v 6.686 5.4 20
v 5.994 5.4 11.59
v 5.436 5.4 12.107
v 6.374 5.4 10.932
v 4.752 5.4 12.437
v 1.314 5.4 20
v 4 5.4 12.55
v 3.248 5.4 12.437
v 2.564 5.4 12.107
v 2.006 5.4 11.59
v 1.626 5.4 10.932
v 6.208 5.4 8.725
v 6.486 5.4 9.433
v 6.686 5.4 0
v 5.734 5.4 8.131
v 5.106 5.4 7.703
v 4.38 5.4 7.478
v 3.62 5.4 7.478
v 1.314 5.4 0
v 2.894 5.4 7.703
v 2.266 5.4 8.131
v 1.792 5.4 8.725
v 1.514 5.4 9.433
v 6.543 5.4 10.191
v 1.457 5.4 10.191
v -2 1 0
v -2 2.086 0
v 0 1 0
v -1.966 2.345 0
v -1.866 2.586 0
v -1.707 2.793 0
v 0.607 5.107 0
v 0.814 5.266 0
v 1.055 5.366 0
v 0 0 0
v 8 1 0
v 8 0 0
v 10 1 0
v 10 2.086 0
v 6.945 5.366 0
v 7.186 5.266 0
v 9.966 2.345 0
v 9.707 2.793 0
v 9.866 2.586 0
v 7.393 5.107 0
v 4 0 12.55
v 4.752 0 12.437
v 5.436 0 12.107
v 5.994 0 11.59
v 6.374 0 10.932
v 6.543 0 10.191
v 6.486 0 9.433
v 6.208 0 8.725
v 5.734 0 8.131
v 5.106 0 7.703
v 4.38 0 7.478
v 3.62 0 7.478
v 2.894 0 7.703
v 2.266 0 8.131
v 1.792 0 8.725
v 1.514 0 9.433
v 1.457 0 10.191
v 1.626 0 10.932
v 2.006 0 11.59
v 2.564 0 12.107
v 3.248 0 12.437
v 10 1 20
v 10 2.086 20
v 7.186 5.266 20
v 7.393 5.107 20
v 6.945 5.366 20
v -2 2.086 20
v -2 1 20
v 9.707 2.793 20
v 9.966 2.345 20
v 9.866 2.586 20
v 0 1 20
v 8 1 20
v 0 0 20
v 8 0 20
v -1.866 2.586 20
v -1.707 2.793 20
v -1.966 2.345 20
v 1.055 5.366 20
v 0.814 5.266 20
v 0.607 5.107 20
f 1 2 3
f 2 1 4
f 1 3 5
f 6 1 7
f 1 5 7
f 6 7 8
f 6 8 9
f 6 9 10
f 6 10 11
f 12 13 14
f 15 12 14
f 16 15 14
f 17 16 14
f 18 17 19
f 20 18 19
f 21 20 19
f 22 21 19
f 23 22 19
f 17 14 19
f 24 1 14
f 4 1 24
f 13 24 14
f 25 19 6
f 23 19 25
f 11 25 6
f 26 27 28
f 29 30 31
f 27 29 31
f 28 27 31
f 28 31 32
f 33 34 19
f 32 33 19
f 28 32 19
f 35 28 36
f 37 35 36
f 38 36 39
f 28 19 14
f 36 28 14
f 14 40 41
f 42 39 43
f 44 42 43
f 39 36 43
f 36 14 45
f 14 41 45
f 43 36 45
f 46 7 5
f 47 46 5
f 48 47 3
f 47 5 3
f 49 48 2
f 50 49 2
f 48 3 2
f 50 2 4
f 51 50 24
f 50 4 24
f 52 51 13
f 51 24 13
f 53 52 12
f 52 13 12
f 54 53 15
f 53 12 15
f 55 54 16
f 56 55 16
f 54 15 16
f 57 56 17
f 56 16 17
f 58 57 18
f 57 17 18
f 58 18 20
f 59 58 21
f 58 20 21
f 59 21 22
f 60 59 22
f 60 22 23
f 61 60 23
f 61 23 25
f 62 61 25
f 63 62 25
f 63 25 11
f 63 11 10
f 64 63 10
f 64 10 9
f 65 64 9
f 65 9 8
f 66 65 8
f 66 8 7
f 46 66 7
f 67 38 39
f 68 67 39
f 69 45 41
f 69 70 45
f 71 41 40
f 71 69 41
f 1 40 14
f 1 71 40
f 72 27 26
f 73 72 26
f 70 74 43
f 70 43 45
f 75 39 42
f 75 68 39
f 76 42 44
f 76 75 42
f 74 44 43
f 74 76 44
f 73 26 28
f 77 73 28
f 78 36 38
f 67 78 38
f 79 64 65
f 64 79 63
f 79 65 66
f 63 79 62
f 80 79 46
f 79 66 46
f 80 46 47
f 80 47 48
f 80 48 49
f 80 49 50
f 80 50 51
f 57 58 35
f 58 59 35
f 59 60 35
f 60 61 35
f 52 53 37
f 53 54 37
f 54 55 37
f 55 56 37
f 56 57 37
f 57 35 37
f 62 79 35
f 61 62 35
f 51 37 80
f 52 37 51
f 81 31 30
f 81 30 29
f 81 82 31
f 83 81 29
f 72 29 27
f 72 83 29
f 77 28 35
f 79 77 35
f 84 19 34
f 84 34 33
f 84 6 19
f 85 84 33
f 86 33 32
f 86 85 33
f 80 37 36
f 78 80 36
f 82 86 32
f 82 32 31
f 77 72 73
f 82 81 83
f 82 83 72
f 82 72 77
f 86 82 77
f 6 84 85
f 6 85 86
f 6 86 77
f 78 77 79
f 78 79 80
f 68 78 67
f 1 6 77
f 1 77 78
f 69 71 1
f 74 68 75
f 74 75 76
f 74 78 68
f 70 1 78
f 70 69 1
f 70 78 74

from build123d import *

# Parameters (mm, degrees)
EXTRUDE1_DEPTH = 20
FILLET1_R      = 1
SKETCH2_R      = 2.55
EXTRUDE2_DEPTH = 24.003477998


with BuildPart() as part:
    # Sketch1 → Extrude1 (new body)
    with BuildSketch(Plane.XY):
        Polygon((0, 0), (8, 0), (8, 1), (10, 1), (10, 2.5), (7.1, 5.4), (0.9, 5.4), (-2, 2.5), (-2, 1), (0, 1), align=None)
    extrude(amount=EXTRUDE1_DEPTH)

    # Fillet1
    fillet1_edges = [part.edges().sort_by_distance(p)[0] for p in [
        (-2, 2.5, 10),
        (0.9, 5.4, 10),
        (7.1, 5.4, 10),
        (10, 2.5, 10),
    ]]
    fillet(fillet1_edges, radius=FILLET1_R)

    # Sketch2 → Extrude2 (cut, through all)
    with BuildSketch(Plane(origin=(0, 5.4, 0), x_dir=(1, 0, 0), z_dir=(0, 1, 0))):
        with Locations(Location((4, -10, 0), (0, 0, 270))):
            Circle(SKETCH2_R)
    extrude(amount=-EXTRUDE2_DEPTH, mode=Mode.SUBTRACT)


solid = part.part
